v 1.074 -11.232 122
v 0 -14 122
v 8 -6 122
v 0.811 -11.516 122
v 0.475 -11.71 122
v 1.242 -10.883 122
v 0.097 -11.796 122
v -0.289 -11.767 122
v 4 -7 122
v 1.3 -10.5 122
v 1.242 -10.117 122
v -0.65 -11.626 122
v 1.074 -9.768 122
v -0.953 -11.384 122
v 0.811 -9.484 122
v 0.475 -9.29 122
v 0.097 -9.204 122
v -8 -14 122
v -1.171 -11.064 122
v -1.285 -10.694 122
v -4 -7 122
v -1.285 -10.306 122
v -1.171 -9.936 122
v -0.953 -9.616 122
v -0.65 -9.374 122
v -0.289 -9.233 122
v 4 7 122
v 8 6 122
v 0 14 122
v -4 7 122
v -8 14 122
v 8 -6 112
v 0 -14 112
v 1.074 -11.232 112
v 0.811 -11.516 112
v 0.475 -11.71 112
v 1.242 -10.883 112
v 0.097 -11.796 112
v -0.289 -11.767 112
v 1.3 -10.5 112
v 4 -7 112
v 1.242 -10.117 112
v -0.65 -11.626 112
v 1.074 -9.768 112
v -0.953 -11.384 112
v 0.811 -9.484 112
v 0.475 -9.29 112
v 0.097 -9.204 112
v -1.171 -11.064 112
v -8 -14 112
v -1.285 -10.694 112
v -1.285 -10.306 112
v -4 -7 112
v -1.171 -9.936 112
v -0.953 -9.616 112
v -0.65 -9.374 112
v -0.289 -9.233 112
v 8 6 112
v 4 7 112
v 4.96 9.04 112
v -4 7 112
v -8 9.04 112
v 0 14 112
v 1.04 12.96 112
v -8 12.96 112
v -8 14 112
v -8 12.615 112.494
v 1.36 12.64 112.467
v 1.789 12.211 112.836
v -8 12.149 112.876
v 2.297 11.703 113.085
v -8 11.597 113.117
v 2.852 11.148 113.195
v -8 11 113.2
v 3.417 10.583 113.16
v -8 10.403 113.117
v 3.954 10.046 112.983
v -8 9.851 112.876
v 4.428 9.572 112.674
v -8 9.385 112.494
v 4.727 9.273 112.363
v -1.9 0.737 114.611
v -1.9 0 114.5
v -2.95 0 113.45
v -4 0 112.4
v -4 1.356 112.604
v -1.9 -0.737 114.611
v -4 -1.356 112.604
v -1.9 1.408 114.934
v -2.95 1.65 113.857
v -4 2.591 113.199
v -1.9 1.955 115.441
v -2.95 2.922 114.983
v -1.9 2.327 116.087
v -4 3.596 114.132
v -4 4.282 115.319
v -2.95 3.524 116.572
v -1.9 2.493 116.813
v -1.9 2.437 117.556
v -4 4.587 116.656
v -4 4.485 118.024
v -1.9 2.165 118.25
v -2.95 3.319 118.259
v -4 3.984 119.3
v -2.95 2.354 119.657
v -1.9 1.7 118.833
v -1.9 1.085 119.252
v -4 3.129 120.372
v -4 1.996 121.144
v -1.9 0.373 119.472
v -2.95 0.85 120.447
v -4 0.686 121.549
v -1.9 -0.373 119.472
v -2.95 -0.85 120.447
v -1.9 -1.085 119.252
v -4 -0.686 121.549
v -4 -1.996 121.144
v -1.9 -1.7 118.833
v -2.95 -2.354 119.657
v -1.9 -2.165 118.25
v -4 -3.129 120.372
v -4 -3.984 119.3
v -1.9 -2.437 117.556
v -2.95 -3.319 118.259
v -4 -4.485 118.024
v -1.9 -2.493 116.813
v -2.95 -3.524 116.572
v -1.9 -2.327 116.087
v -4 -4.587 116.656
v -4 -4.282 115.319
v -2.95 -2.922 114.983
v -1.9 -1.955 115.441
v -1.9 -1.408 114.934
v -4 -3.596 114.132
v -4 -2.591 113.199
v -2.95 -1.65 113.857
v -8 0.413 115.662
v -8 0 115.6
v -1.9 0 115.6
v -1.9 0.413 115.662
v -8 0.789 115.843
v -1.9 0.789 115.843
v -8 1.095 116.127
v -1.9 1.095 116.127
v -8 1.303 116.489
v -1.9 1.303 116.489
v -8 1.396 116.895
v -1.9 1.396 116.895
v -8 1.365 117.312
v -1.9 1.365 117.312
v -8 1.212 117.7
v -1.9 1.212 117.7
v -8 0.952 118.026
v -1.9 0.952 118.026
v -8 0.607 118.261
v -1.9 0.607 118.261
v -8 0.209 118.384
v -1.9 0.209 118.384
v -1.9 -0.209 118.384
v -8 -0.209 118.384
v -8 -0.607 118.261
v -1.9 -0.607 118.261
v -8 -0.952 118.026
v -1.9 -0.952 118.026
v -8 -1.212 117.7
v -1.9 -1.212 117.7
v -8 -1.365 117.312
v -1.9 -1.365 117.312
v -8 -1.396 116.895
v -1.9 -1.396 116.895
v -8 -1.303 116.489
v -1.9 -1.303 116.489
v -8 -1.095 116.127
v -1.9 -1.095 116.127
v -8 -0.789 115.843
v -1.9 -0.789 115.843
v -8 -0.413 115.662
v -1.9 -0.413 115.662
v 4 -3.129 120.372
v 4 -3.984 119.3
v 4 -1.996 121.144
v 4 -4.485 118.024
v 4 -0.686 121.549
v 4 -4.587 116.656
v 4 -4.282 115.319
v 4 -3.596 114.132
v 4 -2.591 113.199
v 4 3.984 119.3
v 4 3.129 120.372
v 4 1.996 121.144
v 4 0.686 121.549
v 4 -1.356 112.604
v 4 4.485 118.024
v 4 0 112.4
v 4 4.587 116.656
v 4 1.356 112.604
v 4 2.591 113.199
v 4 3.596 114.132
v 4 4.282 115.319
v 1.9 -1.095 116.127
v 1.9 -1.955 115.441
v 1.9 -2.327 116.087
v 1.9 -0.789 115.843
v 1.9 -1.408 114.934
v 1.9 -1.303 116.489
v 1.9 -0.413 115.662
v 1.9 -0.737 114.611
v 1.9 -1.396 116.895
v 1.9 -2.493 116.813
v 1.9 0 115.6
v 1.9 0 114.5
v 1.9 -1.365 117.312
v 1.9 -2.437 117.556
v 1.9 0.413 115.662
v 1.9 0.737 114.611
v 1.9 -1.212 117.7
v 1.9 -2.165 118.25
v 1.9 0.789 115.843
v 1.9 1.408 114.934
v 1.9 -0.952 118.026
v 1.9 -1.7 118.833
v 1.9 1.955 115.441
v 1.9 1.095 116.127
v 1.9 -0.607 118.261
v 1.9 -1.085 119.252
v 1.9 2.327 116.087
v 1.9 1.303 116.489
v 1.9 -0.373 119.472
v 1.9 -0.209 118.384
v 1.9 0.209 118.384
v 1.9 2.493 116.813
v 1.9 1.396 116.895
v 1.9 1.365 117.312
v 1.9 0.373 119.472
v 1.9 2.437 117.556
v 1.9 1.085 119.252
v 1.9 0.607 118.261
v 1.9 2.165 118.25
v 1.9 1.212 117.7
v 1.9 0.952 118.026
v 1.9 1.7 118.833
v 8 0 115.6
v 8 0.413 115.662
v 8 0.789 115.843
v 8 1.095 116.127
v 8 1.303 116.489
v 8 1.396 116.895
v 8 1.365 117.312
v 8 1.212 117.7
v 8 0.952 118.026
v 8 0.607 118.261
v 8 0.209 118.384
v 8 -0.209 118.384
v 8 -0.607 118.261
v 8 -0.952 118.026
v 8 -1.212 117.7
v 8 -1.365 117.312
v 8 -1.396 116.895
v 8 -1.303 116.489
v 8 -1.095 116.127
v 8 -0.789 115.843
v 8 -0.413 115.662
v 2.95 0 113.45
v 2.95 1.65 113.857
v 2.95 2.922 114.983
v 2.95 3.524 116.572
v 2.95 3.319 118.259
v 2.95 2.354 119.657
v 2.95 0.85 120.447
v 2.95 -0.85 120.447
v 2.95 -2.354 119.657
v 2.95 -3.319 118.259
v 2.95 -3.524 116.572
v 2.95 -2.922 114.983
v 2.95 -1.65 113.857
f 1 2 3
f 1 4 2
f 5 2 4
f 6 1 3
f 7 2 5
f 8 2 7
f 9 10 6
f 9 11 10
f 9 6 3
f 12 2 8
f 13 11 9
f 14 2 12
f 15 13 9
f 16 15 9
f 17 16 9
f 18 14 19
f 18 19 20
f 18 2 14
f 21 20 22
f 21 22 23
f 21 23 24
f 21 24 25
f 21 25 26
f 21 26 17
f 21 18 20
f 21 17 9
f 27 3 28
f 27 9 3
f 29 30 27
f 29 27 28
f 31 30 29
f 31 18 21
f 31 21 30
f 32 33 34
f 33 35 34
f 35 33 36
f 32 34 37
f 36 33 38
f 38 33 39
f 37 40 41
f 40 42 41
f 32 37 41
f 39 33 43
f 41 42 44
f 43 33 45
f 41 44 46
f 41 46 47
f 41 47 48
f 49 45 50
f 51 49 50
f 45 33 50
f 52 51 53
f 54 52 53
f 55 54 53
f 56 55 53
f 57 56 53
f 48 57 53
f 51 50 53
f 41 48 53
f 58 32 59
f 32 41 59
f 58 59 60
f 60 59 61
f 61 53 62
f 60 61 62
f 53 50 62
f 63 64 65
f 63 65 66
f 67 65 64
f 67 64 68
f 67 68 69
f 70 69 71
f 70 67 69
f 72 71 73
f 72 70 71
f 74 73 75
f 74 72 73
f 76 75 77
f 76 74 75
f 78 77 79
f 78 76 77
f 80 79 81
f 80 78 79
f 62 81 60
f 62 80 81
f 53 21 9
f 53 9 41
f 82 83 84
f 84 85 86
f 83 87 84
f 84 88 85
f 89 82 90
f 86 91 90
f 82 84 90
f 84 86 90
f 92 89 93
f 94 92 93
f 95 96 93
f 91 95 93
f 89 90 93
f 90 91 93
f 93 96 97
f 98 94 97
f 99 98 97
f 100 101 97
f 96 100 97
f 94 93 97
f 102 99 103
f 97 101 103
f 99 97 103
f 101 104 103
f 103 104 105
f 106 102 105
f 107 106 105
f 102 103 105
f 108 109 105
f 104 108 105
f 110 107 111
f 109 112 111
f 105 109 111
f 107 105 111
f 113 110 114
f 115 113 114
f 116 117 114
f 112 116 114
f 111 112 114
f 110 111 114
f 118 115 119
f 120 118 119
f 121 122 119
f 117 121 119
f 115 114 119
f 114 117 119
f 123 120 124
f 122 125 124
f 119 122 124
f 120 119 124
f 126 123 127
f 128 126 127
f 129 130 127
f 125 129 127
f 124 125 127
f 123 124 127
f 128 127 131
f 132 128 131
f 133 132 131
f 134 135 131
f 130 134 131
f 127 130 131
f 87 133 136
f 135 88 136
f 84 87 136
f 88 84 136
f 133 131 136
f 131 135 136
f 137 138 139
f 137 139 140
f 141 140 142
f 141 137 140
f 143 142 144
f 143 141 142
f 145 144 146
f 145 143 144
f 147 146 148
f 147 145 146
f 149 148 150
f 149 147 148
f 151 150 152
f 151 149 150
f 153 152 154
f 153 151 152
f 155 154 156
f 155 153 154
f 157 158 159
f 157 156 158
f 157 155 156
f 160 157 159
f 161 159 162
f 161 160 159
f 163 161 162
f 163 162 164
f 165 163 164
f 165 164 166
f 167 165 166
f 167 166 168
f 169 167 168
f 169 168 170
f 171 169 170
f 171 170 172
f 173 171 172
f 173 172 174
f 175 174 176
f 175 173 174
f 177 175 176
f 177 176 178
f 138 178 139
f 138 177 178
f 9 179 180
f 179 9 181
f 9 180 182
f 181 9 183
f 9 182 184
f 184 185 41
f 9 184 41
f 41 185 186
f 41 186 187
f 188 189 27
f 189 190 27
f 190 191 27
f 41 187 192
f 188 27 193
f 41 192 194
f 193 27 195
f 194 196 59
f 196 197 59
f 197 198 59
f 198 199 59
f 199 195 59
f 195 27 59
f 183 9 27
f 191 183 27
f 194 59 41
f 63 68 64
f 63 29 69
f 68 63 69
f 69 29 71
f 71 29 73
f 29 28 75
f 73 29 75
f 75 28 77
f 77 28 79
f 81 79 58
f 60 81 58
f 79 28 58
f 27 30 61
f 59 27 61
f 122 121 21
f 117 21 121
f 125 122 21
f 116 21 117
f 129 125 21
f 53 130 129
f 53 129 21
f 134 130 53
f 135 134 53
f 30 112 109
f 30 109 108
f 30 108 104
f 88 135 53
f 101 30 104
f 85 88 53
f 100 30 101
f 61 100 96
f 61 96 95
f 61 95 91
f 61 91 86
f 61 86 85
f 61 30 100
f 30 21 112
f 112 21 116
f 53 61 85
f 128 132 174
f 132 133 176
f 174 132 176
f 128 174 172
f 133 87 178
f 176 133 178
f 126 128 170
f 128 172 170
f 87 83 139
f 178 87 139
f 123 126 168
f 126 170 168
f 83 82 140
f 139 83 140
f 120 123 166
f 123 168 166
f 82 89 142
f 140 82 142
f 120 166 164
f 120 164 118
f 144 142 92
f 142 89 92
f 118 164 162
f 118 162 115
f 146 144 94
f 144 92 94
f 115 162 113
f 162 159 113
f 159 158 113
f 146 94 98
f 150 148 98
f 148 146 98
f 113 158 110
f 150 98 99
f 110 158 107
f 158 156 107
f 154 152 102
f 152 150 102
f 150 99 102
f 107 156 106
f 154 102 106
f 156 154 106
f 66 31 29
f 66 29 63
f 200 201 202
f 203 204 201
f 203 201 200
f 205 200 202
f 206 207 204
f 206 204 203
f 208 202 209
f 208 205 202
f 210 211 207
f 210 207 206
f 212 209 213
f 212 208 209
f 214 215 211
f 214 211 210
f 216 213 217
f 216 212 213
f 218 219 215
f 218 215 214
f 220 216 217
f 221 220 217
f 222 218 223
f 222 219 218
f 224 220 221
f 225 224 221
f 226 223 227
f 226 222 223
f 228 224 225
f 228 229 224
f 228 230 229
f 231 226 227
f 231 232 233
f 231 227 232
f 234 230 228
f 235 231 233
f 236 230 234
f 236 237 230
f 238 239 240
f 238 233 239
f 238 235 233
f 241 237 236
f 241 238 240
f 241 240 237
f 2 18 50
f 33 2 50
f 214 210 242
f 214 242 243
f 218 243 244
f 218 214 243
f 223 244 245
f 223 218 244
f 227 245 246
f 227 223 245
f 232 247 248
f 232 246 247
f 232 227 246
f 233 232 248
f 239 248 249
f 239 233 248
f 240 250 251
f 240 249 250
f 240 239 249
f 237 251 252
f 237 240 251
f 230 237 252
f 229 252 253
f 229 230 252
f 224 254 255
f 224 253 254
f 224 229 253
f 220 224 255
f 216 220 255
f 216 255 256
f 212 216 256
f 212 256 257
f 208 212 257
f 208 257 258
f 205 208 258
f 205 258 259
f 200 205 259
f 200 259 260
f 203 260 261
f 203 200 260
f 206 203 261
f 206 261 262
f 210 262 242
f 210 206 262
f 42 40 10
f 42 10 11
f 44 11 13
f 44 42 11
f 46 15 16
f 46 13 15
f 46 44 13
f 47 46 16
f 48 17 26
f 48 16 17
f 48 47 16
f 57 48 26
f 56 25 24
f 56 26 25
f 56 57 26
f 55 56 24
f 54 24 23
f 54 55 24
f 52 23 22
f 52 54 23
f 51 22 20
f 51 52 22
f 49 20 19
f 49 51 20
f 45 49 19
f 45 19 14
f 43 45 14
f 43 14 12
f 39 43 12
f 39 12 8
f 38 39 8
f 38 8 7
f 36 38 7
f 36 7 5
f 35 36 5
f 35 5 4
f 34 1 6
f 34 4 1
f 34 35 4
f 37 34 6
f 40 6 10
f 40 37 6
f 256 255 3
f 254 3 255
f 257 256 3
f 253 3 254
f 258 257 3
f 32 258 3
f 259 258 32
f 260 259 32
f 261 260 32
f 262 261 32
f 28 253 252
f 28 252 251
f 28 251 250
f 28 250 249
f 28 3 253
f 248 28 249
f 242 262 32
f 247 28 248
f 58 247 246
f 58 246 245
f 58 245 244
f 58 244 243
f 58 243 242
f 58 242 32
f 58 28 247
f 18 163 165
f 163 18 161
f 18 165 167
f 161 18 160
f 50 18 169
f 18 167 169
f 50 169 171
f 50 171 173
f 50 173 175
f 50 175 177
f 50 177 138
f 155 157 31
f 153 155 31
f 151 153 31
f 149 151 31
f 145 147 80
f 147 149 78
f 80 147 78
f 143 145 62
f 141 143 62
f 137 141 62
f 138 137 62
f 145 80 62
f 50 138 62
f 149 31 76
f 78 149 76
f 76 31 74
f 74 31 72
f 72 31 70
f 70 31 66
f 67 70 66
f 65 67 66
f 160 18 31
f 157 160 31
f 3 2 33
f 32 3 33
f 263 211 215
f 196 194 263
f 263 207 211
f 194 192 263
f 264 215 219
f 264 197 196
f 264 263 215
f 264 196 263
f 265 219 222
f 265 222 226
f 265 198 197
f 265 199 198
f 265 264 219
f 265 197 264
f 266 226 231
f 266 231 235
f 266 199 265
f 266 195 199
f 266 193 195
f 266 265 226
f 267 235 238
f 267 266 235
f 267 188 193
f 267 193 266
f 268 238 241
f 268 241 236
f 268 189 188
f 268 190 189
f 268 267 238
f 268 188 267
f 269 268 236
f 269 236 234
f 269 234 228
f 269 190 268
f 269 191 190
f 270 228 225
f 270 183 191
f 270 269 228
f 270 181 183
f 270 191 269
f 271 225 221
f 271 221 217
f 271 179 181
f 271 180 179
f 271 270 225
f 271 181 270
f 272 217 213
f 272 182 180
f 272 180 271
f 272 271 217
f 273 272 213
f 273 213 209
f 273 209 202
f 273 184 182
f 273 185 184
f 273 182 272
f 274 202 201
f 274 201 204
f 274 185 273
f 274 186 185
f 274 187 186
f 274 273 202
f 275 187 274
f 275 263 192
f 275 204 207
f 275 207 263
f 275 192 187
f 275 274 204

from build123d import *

# Parameters (mm, degrees)
CYLINDER054061_R                           = 1.3
CYLINDER054061_DEPTH                       = 50
CYLINDER054060_R                           = 2.2
CYLINDER054060_DEPTH                       = 20
CYLINDER054060_PITCH_ANGLE                 = 90
CYLINDER054056_R                           = 1.4
CYLINDER054056_DEPTH                       = 40
CYLINDER054056_PITCH_ANGLE                 = 90
BOX112015002017004007004036_W              = 60
BOX112015002017004007004036_H              = 14
BOX112015002017004007004036_DEPTH          = 8
BOX112015002017004007004036_PITCH_ANGLE    = 90
BOX112015002017004007004037_W              = 10
BOX112015002017004007004037_H              = 28
BOX112015002017004007004037_DEPTH          = 16
BOX112015002017004007004037_PITCH_ANGLE    = 90
CHAMFER006012025_SIZE                      = 8
CHAMFER006012026_SIZE                      = 8
CONE012_PITCH_ANGLE                        = 90
PART_MIRRORING005008_PITCH_ANGLE           = 90
BOX112015002017004007004038008_W           = 10
BOX112015002017004007004038008_H           = 28
BOX112015002017004007004038008_DEPTH       = 16
BOX112015002017004007004038008_PITCH_ANGLE = 90


with BuildPart() as cylinder054101:
    # Cylinder054061 → Cylinder054061 (new body)
    with BuildSketch(Plane(origin=(0, -10.5, 7), x_dir=(1, 0, 0), z_dir=(0, 0, 1))):
        Circle(CYLINDER054061_R)
    extrude(amount=CYLINDER054061_DEPTH)


with BuildPart() as cylinder054100:
    # Cylinder054060 → Cylinder054060 (new body)
    with BuildSketch(Plane.XY):
        Circle(CYLINDER054060_R)
    extrude(amount=CYLINDER054060_DEPTH)


with BuildPart() as cylinder054100_1:
    # Cylinder054060 pitch: moved
    add(cylinder054100.part.rotate(Axis((0, 0, 0), (0, 1, 0)), CYLINDER054060_PITCH_ANGLE))


with BuildPart() as cylinder054100_2:
    # Cylinder054060 placement: moved
    add(cylinder054100_1.part.moved(Location((-10, 11, 32))))


with BuildPart() as bearing_m3:
    # Cylinder054056 → Cylinder054056 (new body)
    with BuildSketch(Plane.XY):
        Circle(CYLINDER054056_R)
    extrude(amount=CYLINDER054056_DEPTH)


with BuildPart() as bearing_m3_1:
    # Cylinder054056 pitch: moved
    add(bearing_m3.part.rotate(Axis((0, 0, 0), (0, 1, 0)), CYLINDER054056_PITCH_ANGLE))


with BuildPart() as bearing_m3_2:
    # Cylinder054056 placement: moved
    add(bearing_m3_1.part.moved(Location((-20, 0, 38))))


with BuildPart() as cube119:
    # Box112015002017004007004036 → Box112015002017004007004036 (new body)
    with BuildSketch(Plane.XY):
        with Locations((30, 7)):
            Rectangle(BOX112015002017004007004036_W, BOX112015002017004007004036_H)
    extrude(amount=BOX112015002017004007004036_DEPTH)


with BuildPart() as cube119_1:
    # Box112015002017004007004036 pitch: moved
    add(cube119.part.rotate(Axis((0, 0, 0), (0, 1, 0)), BOX112015002017004007004036_PITCH_ANGLE))


with BuildPart() as cube119_2:
    # Box112015002017004007004036 placement: moved
    add(cube119_1.part.moved(Location((-4, -7, 68))))


with BuildPart() as cut298:
    # Box112015002017004007004037 → Box112015002017004007004037 (new body)
    with BuildSketch(Plane.XY):
        with Locations((5, 14)):
            Rectangle(BOX112015002017004007004037_W, BOX112015002017004007004037_H)
    extrude(amount=BOX112015002017004007004037_DEPTH)


with BuildPart() as cut298_1:
    # Box112015002017004007004037 pitch: moved
    add(cut298.part.rotate(Axis((0, 0, 0), (0, 1, 0)), BOX112015002017004007004037_PITCH_ANGLE))


with BuildPart() as cut298_2:
    # Box112015002017004007004037 placement: moved
    add(cut298_1.part.moved(Location((-8, -14, 43))))

    # Chamfer006012025
    chamfer006012025_edges = [cut298_2.edges().sort_by_distance(p)[0] for p in [
        (8, 14, 38),
    ]]
    chamfer(chamfer006012025_edges, length=CHAMFER006012025_SIZE)

    # Chamfer006012026
    chamfer006012026_edges = [cut298_2.edges().sort_by_distance(p)[0] for p in [
        (8, -14, 38),
    ]]
    chamfer(chamfer006012026_edges, length=CHAMFER006012026_SIZE)

    # Cut298: cut Cube119
    add(cube119_2.part, mode=Mode.SUBTRACT)


with BuildPart() as cone012:
    # Cone012 → Cone012 (revolve)
    with BuildSketch(Plane.XZ):
        Polygon((0, 0), (2.5, 0), (5.5, 3), (0, 3), align=None)
    revolve(axis=Axis((0, 0, 0), (0, 0, 1)))


with BuildPart() as cone012_1:
    # Cone012 pitch: moved
    add(cone012.part.rotate(Axis((0, 0, 0), (0, 1, 0)), CONE012_PITCH_ANGLE))


with BuildPart() as cone012_2:
    # Cone012 placement: moved
    add(cone012_1.part.moved(Location((1.9, 0, 38))))


with BuildPart() as cone011:
    # Cone011 → Cone011 (revolve)
    with BuildSketch(Plane(origin=(0, 0, 2), x_dir=(1, 0, 0), z_dir=(0, -1, 0))):
        Polygon((0, 0), (2.5, 0), (5.5, 3), (0, 3), align=None)
    revolve(axis=Axis((0, 0, 2), (0, 0, 1)))


with BuildPart() as bearing_cones:
    # Part__Mirroring005008: instance of Cone011
    add(cone011.part.mirror(Plane(origin=(0, 0, 0), x_dir=(0, 1, 0), z_dir=(0, 0, 1))))


with BuildPart() as bearing_cones_1:
    # Part__Mirroring005008 pitch: moved
    add(bearing_cones.part.rotate(Axis((0, 0, 0), (0, 1, 0)), PART_MIRRORING005008_PITCH_ANGLE))


with BuildPart() as bearing_cones_2:
    # Part__Mirroring005008 placement: moved
    add(bearing_cones_1.part.moved(Location((0.1, 0, 38))))

    # Fusion051010010012015014027: union Cone012
    add(cone012_2.part)


with BuildPart() as f_6144_wire_tensioner_block:
    # Box112015002017004007004038008 → Box112015002017004007004038008 (new body)
    with BuildSketch(Plane.XY):
        with Locations((5, 14)):
            Rectangle(BOX112015002017004007004038008_W, BOX112015002017004007004038008_H)
    extrude(amount=BOX112015002017004007004038008_DEPTH)


with BuildPart() as f_6144_wire_tensioner_block_1:
    # Box112015002017004007004038008 pitch: moved
    add(f_6144_wire_tensioner_block.part.rotate(Axis((0, 0, 0), (0, 1, 0)), BOX112015002017004007004038008_PITCH_ANGLE))


with BuildPart() as f_6144_wire_tensioner_block_2:
    # Box112015002017004007004038008 placement: moved
    add(f_6144_wire_tensioner_block_1.part.moved(Location((-8, -14, 43))))

    # Common010: intersect bearing-cones
    add(bearing_cones_2.part, mode=Mode.INTERSECT)

    # Fusion051010010012015014034: union Cut298
    add(cut298_2.part)

    # Cut299: cut bearing-M3
    add(bearing_m3_2.part, mode=Mode.SUBTRACT)

    # Cut300: cut Cylinder054100
    add(cylinder054100_2.part, mode=Mode.SUBTRACT)

    # Cut301: cut Cylinder054101
    add(cylinder054101.part, mode=Mode.SUBTRACT)


with BuildPart() as f_6144_wire_tensioner_block_3:
    # Cut301 placement: moved
    add(f_6144_wire_tensioner_block_2.part.moved(Location((0, 0, 79))))


solid = f_6144_wire_tensioner_block_3.part
